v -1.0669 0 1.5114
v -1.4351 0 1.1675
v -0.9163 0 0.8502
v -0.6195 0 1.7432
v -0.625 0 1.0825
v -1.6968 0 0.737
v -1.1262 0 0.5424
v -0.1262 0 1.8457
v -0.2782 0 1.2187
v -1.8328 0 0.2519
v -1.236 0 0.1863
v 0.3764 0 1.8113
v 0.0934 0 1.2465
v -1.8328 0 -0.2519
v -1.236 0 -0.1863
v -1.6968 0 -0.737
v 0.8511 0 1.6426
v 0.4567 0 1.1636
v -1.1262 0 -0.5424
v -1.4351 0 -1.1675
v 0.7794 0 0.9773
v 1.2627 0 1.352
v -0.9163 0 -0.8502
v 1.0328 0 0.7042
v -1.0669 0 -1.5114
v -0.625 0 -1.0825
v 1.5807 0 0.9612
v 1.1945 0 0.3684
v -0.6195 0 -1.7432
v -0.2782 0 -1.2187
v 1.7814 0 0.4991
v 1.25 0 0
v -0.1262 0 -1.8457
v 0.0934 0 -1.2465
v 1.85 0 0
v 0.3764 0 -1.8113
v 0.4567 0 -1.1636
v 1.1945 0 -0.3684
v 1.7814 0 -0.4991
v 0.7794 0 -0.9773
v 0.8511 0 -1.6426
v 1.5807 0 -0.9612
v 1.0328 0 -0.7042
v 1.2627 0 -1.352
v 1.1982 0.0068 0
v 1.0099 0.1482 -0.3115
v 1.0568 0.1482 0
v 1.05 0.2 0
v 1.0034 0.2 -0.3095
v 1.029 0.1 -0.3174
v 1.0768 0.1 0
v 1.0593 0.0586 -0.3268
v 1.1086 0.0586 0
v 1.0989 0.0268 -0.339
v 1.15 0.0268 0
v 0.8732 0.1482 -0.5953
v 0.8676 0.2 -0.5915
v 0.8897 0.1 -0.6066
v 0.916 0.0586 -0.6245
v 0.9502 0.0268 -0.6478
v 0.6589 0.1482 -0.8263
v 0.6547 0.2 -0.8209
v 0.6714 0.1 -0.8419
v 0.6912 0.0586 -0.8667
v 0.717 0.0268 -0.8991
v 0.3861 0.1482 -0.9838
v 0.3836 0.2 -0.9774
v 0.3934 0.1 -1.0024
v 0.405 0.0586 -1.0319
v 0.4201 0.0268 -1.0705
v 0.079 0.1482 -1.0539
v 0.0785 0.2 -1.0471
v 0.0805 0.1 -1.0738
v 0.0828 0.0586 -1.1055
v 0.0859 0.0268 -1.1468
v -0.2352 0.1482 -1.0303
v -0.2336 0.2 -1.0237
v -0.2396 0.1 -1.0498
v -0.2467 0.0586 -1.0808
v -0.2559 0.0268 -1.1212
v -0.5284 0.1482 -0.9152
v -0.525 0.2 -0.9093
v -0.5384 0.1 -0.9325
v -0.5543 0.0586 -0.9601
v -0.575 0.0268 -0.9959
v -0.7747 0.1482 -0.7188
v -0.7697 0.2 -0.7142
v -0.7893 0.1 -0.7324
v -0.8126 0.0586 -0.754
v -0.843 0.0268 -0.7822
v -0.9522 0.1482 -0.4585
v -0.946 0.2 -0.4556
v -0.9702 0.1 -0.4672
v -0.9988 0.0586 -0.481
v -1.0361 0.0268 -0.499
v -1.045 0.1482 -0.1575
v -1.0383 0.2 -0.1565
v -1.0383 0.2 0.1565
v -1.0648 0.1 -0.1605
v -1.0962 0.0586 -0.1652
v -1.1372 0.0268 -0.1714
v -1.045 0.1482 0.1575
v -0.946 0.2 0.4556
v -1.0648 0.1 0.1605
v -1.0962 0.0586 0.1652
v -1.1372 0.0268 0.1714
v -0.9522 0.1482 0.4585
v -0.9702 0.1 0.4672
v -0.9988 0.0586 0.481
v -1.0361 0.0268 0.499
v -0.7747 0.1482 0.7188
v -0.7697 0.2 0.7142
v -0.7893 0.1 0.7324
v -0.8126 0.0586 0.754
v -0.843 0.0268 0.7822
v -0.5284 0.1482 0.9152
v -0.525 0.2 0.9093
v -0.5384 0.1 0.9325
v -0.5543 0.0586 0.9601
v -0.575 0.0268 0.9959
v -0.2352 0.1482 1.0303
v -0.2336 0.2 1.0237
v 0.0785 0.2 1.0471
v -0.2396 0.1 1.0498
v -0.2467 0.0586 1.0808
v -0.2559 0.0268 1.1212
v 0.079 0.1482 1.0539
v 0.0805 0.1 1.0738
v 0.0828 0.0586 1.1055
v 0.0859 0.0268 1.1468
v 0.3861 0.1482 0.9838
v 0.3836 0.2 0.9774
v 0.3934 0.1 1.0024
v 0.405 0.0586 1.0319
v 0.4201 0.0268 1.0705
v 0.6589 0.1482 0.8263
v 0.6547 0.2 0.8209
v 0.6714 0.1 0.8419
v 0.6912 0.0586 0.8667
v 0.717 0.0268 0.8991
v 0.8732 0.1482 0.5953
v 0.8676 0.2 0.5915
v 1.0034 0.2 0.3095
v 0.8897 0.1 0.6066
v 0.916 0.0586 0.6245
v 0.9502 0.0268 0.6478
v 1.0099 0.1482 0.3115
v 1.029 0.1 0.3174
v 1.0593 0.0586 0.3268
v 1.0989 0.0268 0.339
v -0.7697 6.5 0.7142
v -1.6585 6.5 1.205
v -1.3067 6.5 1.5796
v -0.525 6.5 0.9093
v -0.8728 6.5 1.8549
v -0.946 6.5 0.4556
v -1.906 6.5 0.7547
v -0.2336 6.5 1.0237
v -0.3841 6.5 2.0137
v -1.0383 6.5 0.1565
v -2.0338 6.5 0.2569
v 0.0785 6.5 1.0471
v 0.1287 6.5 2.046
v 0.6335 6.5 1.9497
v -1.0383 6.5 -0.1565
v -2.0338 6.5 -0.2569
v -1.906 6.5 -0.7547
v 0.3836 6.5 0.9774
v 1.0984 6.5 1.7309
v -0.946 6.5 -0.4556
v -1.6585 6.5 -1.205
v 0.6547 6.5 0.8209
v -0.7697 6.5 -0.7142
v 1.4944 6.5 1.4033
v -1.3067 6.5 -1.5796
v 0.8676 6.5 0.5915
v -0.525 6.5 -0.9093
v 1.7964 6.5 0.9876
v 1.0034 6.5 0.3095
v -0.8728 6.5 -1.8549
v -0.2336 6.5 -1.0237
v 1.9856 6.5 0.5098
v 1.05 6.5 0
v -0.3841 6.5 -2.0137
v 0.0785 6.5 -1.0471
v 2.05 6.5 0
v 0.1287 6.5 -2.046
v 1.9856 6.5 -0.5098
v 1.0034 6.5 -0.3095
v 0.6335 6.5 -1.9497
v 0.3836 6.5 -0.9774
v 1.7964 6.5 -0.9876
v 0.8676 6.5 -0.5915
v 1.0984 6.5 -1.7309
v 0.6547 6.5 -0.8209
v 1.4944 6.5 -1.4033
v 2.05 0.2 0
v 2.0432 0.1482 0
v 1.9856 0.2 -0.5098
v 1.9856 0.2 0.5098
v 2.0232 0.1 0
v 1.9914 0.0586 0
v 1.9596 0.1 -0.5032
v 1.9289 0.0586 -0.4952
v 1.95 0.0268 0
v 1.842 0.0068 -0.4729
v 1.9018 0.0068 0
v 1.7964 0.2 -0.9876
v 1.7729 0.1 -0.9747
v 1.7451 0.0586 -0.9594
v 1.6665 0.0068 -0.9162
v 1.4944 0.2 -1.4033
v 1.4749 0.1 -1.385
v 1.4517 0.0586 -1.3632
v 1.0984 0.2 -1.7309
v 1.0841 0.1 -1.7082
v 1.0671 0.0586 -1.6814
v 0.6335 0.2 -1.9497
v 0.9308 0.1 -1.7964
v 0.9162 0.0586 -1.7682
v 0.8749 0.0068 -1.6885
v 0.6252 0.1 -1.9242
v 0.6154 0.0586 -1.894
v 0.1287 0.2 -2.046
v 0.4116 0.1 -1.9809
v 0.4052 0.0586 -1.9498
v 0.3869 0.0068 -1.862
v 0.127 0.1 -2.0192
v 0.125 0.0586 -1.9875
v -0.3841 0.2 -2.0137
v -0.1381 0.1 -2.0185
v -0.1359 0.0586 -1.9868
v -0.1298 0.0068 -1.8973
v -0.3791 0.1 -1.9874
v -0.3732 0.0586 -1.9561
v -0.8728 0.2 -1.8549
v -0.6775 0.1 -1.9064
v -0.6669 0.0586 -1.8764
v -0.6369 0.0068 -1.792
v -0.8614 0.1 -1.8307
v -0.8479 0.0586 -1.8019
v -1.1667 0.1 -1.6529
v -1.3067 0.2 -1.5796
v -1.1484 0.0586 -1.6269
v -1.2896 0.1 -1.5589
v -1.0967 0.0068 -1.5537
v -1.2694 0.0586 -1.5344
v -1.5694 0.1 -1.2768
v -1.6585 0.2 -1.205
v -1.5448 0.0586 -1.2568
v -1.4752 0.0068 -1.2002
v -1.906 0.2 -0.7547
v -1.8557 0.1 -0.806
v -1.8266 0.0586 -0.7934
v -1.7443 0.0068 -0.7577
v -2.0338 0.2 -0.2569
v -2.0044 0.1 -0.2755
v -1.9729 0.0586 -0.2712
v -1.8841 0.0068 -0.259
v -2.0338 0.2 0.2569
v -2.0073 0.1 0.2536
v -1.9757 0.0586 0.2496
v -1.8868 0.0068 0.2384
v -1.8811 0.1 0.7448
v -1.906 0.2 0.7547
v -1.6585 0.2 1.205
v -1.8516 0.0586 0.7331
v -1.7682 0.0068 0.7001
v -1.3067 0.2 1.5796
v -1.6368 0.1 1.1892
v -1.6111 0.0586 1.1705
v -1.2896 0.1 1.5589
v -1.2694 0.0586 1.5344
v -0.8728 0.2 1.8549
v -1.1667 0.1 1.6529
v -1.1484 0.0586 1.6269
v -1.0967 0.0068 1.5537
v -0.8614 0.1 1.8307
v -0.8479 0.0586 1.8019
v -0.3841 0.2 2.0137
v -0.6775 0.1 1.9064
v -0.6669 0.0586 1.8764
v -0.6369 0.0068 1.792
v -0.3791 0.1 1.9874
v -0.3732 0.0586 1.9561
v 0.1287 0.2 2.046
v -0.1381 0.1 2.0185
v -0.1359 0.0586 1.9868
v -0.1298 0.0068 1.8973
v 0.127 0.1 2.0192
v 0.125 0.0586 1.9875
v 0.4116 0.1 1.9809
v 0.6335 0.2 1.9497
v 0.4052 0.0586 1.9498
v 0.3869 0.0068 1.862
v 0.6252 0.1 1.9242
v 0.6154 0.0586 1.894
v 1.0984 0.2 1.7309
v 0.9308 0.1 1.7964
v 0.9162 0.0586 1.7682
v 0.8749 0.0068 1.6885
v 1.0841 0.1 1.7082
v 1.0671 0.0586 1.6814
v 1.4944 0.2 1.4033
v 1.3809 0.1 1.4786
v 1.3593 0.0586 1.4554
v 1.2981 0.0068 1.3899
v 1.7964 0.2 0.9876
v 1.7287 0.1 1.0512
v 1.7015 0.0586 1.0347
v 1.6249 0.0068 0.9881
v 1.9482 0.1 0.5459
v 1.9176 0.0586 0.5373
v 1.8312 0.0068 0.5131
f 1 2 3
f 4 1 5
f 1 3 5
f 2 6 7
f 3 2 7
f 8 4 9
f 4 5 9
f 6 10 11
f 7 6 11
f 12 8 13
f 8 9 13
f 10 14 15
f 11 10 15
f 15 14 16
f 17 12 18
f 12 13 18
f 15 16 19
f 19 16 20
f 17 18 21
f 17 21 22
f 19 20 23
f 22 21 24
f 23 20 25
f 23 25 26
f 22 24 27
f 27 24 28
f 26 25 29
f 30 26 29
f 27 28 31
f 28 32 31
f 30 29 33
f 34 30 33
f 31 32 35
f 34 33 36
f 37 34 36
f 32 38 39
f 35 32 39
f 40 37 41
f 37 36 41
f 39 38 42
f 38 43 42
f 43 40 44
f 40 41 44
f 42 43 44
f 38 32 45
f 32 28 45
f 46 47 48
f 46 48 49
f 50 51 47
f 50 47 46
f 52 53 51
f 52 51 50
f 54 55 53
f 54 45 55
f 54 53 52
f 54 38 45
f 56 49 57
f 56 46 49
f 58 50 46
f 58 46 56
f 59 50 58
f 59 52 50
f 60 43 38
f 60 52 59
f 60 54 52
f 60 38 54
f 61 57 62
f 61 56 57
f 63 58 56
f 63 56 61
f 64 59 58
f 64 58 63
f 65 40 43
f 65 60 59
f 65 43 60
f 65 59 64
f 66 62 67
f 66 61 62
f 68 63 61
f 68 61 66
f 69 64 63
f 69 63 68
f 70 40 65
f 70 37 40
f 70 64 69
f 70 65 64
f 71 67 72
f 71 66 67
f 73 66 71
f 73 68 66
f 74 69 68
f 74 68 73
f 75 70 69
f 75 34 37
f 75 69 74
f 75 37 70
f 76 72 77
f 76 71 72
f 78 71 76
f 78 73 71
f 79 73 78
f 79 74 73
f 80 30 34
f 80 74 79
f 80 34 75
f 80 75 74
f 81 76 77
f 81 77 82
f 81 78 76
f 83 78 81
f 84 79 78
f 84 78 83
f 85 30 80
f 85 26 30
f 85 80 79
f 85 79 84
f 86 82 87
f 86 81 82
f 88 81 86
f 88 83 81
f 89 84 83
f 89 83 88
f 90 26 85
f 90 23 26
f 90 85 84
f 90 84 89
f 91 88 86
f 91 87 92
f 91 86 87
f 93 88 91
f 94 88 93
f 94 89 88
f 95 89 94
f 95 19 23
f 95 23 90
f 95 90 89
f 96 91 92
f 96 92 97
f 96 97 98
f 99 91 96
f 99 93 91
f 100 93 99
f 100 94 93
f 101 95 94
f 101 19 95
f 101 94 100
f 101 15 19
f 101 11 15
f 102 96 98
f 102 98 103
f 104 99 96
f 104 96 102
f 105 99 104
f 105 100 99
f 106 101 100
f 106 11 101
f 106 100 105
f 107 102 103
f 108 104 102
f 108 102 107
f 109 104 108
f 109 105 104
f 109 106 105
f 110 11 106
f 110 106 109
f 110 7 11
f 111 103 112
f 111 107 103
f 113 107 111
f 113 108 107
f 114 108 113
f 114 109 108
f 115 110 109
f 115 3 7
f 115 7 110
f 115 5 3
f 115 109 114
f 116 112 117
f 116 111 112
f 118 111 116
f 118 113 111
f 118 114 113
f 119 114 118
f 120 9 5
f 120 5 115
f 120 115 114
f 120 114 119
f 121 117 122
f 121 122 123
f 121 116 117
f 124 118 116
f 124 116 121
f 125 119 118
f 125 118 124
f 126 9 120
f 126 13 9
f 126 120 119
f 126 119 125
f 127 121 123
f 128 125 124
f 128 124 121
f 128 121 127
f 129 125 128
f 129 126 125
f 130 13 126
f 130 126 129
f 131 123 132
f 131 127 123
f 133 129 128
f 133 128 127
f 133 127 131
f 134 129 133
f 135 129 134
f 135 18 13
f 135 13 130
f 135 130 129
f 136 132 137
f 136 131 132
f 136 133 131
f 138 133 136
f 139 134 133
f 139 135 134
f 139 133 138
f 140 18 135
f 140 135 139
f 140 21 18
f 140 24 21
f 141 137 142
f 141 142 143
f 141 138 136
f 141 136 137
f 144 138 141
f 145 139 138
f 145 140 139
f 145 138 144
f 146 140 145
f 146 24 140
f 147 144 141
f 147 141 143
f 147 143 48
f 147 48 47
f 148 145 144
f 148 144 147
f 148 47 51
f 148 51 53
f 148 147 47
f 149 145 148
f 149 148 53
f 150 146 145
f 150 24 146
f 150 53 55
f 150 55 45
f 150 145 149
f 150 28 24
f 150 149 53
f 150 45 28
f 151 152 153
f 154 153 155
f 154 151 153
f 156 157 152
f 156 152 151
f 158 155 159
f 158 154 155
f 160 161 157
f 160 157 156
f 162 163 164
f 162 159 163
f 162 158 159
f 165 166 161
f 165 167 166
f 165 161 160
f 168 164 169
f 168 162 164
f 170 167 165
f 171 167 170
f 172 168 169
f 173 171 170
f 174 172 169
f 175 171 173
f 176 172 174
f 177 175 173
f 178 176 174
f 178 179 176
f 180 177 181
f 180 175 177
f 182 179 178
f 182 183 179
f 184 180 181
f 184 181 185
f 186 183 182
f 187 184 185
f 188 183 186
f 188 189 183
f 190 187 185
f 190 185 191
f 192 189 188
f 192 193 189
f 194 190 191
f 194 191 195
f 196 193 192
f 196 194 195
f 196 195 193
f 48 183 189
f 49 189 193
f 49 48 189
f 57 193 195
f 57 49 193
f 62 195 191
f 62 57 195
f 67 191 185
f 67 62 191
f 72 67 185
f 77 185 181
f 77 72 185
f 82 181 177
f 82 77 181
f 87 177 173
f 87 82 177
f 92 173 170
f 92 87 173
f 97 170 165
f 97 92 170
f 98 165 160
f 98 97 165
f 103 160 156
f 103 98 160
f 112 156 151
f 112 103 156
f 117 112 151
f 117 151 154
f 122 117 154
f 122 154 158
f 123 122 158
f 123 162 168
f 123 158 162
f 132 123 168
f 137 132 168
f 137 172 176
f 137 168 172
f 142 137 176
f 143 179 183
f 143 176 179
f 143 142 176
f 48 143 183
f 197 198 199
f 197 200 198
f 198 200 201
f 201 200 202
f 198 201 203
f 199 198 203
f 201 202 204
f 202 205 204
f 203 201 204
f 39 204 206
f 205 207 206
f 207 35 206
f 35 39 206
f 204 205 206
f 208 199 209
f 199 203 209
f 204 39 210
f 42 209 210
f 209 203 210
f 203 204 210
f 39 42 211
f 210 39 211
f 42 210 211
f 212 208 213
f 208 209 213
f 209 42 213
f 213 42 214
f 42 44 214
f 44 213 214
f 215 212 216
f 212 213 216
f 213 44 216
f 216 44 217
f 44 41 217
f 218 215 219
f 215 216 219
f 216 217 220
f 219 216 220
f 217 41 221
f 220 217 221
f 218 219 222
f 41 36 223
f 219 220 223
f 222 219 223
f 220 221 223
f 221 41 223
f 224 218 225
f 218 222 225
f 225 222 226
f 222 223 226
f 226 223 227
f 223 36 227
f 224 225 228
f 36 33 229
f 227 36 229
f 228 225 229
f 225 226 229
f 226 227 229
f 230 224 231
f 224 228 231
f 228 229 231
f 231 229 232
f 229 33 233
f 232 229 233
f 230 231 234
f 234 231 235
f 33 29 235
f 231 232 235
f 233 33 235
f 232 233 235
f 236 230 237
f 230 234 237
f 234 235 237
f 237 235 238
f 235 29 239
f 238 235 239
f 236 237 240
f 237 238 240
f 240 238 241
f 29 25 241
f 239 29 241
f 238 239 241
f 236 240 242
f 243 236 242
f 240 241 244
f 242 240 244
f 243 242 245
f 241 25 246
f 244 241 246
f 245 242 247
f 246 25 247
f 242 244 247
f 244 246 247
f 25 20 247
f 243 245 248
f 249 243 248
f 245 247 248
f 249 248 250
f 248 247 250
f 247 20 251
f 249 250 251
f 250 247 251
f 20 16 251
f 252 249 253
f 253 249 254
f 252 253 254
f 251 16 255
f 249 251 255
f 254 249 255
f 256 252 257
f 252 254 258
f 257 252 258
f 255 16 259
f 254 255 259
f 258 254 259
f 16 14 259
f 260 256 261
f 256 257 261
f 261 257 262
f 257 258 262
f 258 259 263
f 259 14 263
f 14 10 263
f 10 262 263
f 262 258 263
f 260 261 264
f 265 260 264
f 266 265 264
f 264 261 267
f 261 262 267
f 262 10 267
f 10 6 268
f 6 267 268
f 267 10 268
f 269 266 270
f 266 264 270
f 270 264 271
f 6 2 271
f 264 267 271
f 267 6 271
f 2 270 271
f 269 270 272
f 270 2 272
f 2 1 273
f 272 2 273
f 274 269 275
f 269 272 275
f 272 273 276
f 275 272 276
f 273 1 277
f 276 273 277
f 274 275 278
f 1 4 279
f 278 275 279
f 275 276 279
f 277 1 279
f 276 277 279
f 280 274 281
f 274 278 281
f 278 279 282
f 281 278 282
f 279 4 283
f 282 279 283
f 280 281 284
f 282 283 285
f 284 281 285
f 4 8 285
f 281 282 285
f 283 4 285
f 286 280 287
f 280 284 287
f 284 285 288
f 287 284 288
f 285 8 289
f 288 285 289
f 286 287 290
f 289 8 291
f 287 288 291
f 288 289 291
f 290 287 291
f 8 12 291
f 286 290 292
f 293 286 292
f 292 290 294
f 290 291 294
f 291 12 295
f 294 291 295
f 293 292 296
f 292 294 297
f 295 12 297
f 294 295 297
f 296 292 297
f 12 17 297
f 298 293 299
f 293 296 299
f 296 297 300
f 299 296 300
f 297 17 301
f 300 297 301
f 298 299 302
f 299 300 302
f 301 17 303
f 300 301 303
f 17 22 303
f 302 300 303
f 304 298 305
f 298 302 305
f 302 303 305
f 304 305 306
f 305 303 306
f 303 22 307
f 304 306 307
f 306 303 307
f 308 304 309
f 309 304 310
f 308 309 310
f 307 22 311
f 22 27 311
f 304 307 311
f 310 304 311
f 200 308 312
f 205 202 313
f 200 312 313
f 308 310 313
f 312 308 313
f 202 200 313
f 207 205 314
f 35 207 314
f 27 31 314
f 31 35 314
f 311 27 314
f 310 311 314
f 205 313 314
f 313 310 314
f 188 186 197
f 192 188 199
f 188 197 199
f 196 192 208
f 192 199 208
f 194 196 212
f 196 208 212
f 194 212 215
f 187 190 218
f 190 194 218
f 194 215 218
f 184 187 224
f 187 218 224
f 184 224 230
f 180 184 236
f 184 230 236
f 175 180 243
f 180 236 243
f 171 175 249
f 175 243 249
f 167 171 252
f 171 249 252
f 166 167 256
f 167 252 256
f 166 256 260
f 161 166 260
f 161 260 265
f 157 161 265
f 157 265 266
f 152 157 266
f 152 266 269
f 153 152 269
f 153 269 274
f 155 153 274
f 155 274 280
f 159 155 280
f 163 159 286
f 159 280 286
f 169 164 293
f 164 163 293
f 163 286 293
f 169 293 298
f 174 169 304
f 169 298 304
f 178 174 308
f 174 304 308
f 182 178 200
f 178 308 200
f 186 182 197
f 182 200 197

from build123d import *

# Parameters (mm, degrees)
SKETCH_1_R          = 2.05
SKETCH_1_R_2        = 1.05
EXTRUDE_1_DEPTH     = 7.5
FILLET_1_R          = 0.2
SKETCH_2_R          = 3.05
CUT_EXTRUDE_1_DEPTH = 1


with BuildPart() as part:
    # 草图1 → 凸台-拉伸1 (new body)
    with BuildSketch(Plane(origin=(0, 0, 0), x_dir=(1, 0, 0), z_dir=(0, 1, 0))):
        Circle(SKETCH_1_R)
        Circle(SKETCH_1_R_2, mode=Mode.SUBTRACT)
    extrude(amount=EXTRUDE_1_DEPTH)

    # 圆角1
    fillet_1_edges = [part.edges().sort_by_distance(p)[0] for p in [
        (-2.05, 0, 0),
        (-2.05, 7.5, 0),
        (-1.05, 0, 0),
        (-1.05, 7.5, 0),
    ]]
    fillet(fillet_1_edges, radius=FILLET_1_R)

    # 草图2 → 切除-拉伸1 (cut)
    with BuildSketch(Plane(origin=(0, 7.5, 0), x_dir=(1, 0, 0), z_dir=(0, 1, 0))):
        Circle(SKETCH_2_R)
    extrude(amount=-CUT_EXTRUDE_1_DEPTH, mode=Mode.SUBTRACT)


solid = part.part
